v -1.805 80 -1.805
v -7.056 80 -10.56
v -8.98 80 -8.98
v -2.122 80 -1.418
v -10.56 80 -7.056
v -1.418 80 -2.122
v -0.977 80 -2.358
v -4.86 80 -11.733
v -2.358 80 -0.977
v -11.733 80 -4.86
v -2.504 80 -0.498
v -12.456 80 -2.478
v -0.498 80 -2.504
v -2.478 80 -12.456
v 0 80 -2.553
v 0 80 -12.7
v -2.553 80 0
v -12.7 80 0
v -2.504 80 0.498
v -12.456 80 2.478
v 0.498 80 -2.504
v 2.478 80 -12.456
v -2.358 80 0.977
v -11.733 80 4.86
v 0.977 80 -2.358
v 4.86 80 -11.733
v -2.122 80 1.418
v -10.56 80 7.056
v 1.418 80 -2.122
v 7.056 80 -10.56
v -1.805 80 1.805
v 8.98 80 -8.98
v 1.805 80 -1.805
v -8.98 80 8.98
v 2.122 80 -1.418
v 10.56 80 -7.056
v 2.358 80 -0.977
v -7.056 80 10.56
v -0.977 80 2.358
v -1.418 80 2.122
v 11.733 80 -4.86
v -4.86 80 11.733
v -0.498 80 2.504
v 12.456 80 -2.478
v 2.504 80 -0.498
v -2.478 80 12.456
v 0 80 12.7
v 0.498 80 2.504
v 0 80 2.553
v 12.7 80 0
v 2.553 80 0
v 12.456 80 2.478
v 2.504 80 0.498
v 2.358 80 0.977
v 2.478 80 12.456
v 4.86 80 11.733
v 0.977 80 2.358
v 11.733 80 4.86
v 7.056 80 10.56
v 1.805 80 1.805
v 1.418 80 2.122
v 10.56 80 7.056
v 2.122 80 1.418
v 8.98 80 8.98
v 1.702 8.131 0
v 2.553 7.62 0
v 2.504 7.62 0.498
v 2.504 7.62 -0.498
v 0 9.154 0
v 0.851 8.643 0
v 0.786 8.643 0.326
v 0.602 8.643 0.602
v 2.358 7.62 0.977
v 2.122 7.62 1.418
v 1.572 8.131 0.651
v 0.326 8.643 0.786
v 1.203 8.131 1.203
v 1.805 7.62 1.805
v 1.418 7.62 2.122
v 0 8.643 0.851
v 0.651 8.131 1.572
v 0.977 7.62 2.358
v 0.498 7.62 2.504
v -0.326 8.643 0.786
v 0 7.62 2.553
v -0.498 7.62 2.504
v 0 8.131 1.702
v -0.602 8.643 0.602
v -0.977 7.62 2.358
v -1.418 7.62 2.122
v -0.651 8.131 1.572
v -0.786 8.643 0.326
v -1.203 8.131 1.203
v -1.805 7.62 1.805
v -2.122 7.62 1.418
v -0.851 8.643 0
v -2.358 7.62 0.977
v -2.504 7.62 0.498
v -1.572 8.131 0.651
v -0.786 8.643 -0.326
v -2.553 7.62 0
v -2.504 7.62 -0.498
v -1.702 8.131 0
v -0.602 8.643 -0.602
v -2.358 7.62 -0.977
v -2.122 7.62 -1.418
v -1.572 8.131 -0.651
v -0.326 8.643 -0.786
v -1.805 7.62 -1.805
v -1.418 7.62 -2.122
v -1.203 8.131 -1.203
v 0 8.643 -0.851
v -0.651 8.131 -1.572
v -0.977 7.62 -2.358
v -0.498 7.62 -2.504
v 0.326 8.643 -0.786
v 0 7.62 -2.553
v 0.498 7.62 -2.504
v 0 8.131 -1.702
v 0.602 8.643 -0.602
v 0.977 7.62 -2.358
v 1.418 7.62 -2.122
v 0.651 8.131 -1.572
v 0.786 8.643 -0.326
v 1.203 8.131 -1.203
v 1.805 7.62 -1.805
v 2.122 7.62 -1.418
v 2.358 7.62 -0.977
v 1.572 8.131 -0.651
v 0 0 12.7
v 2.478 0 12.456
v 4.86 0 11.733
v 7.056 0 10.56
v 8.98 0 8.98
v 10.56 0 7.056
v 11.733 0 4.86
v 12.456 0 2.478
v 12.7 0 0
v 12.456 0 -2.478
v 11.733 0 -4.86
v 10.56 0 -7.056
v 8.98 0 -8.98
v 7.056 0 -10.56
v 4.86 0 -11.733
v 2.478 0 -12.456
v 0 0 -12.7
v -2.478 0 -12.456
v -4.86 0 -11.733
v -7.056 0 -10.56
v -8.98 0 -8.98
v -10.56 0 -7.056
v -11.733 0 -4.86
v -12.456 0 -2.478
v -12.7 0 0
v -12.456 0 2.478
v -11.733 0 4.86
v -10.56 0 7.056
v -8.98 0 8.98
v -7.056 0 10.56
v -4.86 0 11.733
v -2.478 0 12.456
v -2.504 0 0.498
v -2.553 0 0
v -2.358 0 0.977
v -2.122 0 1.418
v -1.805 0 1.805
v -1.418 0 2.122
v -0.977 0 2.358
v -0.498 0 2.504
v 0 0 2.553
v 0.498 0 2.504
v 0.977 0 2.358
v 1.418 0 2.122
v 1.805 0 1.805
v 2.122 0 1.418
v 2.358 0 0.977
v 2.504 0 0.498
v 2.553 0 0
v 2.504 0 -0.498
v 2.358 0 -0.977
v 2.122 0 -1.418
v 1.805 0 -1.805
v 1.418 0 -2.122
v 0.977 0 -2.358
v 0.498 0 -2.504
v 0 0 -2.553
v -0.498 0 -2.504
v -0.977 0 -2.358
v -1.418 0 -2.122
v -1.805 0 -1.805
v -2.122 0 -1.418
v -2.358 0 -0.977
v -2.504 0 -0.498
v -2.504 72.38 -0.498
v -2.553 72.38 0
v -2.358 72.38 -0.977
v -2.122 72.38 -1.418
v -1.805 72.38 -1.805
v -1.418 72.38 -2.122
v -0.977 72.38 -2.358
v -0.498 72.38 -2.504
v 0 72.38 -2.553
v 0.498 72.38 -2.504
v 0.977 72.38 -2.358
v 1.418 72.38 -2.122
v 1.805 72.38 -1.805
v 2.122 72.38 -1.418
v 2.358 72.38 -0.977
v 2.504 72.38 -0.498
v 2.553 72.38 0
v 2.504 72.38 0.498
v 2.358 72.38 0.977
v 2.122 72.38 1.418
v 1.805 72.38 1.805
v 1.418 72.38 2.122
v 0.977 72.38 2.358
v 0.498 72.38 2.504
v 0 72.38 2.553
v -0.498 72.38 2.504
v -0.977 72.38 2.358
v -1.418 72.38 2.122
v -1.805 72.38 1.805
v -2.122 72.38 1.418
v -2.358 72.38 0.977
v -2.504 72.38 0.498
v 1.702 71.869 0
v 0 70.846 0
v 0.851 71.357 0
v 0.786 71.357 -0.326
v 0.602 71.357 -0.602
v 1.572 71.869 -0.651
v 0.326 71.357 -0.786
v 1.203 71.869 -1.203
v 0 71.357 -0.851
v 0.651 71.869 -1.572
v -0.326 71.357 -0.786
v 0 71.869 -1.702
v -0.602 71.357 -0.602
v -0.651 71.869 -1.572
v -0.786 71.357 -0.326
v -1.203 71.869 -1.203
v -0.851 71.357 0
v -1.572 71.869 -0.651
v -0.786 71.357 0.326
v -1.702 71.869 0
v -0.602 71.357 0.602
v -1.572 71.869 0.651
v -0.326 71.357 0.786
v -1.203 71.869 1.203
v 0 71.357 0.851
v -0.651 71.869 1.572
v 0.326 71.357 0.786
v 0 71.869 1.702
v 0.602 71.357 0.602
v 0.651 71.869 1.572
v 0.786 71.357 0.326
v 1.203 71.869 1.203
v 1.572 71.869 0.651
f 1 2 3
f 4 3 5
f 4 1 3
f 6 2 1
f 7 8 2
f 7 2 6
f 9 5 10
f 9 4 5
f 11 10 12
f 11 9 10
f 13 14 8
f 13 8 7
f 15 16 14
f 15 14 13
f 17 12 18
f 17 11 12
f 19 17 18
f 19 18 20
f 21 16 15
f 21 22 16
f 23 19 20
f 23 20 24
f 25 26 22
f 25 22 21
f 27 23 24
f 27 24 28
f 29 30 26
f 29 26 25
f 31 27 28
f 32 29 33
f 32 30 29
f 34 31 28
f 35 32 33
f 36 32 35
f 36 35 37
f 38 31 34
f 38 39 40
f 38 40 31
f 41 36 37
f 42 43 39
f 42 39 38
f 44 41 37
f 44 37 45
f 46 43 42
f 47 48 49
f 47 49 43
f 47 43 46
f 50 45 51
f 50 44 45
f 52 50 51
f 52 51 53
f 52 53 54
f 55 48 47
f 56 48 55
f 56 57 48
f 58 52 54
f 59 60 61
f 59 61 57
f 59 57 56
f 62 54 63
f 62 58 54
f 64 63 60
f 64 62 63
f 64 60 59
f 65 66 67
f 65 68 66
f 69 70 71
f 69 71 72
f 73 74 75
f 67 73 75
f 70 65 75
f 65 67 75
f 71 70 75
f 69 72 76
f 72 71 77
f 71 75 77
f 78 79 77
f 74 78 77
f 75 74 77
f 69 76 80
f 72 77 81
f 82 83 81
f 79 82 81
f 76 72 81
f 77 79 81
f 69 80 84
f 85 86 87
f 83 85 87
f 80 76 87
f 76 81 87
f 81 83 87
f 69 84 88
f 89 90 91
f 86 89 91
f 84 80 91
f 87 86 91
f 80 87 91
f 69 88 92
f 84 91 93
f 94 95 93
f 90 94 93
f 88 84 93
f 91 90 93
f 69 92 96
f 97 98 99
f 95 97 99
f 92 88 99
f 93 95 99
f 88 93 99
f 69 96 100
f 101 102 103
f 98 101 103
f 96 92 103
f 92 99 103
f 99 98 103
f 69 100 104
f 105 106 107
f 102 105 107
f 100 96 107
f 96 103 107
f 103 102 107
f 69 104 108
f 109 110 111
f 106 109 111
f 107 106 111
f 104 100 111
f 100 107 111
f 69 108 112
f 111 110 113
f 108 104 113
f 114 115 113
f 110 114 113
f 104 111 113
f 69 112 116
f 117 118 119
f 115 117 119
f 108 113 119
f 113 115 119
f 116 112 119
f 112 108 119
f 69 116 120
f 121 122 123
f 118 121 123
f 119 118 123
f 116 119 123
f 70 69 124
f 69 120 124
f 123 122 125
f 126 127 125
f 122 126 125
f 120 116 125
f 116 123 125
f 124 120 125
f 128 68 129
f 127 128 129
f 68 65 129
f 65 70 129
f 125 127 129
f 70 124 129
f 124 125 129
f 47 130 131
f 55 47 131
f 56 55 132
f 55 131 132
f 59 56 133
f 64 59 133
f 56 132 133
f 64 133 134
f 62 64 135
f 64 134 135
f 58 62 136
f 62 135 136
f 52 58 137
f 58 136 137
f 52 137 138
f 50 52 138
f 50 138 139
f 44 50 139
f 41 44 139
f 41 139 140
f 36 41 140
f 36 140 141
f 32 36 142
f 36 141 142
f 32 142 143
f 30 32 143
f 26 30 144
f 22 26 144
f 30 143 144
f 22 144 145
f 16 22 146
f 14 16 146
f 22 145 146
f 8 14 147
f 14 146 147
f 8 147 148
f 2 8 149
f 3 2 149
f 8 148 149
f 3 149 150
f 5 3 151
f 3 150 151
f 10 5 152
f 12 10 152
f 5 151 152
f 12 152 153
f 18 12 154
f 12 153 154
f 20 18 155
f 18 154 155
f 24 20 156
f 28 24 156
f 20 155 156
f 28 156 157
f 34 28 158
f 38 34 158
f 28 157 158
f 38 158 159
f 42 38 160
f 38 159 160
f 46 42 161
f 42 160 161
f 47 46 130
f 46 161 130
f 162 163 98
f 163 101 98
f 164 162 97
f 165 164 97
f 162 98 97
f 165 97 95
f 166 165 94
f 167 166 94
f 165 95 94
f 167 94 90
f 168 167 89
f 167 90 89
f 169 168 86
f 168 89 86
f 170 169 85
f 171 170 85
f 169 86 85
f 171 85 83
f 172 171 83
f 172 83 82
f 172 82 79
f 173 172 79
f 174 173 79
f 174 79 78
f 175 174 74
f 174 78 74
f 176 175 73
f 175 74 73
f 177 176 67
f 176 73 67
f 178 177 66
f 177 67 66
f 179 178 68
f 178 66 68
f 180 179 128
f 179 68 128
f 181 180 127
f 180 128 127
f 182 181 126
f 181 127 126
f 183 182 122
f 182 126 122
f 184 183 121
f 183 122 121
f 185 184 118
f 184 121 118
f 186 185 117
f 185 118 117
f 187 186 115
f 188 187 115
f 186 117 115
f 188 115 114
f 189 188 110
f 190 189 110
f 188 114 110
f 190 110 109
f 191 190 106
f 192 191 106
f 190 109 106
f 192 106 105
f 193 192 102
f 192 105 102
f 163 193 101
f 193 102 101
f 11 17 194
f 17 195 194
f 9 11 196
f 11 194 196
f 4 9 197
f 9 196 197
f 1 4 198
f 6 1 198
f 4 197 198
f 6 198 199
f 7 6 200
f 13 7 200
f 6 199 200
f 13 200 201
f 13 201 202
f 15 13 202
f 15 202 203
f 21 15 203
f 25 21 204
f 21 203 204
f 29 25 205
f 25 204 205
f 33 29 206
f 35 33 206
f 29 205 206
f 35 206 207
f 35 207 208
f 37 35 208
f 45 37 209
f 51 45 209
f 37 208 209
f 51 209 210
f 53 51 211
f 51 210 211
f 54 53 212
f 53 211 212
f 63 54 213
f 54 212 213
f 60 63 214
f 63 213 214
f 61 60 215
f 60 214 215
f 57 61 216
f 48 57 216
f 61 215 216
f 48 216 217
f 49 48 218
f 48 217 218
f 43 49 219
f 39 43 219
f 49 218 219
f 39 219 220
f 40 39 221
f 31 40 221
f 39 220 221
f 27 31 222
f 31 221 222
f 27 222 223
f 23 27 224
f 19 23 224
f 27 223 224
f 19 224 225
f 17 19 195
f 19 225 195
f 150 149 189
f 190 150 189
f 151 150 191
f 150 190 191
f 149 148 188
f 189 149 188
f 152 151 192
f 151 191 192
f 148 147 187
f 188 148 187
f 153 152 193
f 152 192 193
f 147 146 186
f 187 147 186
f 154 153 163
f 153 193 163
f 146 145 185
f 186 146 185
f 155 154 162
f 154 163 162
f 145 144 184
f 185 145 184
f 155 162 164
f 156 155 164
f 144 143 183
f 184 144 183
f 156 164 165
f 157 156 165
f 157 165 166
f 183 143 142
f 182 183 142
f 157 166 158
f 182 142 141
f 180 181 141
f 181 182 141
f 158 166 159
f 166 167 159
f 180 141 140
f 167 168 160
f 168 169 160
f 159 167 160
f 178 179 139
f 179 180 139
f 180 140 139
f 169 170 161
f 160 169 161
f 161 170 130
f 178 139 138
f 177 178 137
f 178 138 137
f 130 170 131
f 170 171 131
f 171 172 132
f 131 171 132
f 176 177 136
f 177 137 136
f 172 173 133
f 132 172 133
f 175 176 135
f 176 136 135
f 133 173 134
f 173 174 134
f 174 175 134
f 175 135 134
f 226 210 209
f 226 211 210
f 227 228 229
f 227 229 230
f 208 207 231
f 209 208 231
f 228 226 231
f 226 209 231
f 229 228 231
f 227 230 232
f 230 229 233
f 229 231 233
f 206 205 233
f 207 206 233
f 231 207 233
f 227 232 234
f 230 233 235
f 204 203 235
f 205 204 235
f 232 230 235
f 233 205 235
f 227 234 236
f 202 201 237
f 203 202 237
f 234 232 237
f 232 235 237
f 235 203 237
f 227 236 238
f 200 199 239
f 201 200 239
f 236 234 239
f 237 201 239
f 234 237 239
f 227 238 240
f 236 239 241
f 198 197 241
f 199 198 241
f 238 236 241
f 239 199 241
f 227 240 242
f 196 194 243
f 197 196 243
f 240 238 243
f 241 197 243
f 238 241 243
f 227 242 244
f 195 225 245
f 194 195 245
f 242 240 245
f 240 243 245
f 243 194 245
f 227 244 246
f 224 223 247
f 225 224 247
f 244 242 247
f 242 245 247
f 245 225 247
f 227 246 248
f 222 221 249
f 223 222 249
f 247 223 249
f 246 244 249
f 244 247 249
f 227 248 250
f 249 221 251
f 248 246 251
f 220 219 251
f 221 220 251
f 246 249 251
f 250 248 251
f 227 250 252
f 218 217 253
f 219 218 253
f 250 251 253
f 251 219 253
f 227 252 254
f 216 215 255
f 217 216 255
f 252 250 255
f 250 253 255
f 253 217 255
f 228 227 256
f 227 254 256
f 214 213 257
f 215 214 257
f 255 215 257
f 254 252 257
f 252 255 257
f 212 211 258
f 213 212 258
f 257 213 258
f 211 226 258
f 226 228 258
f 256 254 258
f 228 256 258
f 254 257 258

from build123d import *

# Parameters (mm, degrees)
SKETCH1_R                       = 12.7
BOSS_EXTRUDE1_DEPTH             = 80
TAP_DRILL_FOR_1_4_20_TAP1_D     = 5.1054
TAP_DRILL_FOR_1_4_20_TAP1_DEPTH = 7.62
TAP_DRILL_FOR_1_4_20_TAP1_TIP   = 1.533816902
TAP_DRILL_FOR_1_4_20_TAP2_D     = 5.1054
TAP_DRILL_FOR_1_4_20_TAP2_DEPTH = 7.62
TAP_DRILL_FOR_1_4_20_TAP2_TIP   = 1.533816902


with BuildPart() as part:
    # Sketch1 → Boss-Extrude1 (new body)
    with BuildSketch(Plane(origin=(0, 0, 0), x_dir=(1, 0, 0), z_dir=(0, 1, 0))):
        with Locations(Location((0, 0, 0), (0, 0, 270))):
            Circle(SKETCH1_R)
    extrude(amount=BOSS_EXTRUDE1_DEPTH)

    # Tap Drill for 1/4-20 Tap1
    with Locations(Plane.XZ):
        with Locations((0, 0)):
            Hole(TAP_DRILL_FOR_1_4_20_TAP1_D / 2, depth=TAP_DRILL_FOR_1_4_20_TAP1_DEPTH)
            with Locations((0, 0, -(TAP_DRILL_FOR_1_4_20_TAP1_DEPTH + TAP_DRILL_FOR_1_4_20_TAP1_TIP / 2))):  # 118° drill point
                Cone(0, TAP_DRILL_FOR_1_4_20_TAP1_D / 2, TAP_DRILL_FOR_1_4_20_TAP1_TIP, mode=Mode.SUBTRACT)

    # Tap Drill for 1/4-20 Tap2
    with Locations(Plane(origin=(0, 80, 0), x_dir=(1, 0, 0), z_dir=(0, 1, 0))):
        with Locations((0, 0)):
            Hole(TAP_DRILL_FOR_1_4_20_TAP2_D / 2, depth=TAP_DRILL_FOR_1_4_20_TAP2_DEPTH)
            with Locations((0, 0, -(TAP_DRILL_FOR_1_4_20_TAP2_DEPTH + TAP_DRILL_FOR_1_4_20_TAP2_TIP / 2))):  # 118° drill point
                Cone(0, TAP_DRILL_FOR_1_4_20_TAP2_D / 2, TAP_DRILL_FOR_1_4_20_TAP2_TIP, mode=Mode.SUBTRACT)


solid = part.part
